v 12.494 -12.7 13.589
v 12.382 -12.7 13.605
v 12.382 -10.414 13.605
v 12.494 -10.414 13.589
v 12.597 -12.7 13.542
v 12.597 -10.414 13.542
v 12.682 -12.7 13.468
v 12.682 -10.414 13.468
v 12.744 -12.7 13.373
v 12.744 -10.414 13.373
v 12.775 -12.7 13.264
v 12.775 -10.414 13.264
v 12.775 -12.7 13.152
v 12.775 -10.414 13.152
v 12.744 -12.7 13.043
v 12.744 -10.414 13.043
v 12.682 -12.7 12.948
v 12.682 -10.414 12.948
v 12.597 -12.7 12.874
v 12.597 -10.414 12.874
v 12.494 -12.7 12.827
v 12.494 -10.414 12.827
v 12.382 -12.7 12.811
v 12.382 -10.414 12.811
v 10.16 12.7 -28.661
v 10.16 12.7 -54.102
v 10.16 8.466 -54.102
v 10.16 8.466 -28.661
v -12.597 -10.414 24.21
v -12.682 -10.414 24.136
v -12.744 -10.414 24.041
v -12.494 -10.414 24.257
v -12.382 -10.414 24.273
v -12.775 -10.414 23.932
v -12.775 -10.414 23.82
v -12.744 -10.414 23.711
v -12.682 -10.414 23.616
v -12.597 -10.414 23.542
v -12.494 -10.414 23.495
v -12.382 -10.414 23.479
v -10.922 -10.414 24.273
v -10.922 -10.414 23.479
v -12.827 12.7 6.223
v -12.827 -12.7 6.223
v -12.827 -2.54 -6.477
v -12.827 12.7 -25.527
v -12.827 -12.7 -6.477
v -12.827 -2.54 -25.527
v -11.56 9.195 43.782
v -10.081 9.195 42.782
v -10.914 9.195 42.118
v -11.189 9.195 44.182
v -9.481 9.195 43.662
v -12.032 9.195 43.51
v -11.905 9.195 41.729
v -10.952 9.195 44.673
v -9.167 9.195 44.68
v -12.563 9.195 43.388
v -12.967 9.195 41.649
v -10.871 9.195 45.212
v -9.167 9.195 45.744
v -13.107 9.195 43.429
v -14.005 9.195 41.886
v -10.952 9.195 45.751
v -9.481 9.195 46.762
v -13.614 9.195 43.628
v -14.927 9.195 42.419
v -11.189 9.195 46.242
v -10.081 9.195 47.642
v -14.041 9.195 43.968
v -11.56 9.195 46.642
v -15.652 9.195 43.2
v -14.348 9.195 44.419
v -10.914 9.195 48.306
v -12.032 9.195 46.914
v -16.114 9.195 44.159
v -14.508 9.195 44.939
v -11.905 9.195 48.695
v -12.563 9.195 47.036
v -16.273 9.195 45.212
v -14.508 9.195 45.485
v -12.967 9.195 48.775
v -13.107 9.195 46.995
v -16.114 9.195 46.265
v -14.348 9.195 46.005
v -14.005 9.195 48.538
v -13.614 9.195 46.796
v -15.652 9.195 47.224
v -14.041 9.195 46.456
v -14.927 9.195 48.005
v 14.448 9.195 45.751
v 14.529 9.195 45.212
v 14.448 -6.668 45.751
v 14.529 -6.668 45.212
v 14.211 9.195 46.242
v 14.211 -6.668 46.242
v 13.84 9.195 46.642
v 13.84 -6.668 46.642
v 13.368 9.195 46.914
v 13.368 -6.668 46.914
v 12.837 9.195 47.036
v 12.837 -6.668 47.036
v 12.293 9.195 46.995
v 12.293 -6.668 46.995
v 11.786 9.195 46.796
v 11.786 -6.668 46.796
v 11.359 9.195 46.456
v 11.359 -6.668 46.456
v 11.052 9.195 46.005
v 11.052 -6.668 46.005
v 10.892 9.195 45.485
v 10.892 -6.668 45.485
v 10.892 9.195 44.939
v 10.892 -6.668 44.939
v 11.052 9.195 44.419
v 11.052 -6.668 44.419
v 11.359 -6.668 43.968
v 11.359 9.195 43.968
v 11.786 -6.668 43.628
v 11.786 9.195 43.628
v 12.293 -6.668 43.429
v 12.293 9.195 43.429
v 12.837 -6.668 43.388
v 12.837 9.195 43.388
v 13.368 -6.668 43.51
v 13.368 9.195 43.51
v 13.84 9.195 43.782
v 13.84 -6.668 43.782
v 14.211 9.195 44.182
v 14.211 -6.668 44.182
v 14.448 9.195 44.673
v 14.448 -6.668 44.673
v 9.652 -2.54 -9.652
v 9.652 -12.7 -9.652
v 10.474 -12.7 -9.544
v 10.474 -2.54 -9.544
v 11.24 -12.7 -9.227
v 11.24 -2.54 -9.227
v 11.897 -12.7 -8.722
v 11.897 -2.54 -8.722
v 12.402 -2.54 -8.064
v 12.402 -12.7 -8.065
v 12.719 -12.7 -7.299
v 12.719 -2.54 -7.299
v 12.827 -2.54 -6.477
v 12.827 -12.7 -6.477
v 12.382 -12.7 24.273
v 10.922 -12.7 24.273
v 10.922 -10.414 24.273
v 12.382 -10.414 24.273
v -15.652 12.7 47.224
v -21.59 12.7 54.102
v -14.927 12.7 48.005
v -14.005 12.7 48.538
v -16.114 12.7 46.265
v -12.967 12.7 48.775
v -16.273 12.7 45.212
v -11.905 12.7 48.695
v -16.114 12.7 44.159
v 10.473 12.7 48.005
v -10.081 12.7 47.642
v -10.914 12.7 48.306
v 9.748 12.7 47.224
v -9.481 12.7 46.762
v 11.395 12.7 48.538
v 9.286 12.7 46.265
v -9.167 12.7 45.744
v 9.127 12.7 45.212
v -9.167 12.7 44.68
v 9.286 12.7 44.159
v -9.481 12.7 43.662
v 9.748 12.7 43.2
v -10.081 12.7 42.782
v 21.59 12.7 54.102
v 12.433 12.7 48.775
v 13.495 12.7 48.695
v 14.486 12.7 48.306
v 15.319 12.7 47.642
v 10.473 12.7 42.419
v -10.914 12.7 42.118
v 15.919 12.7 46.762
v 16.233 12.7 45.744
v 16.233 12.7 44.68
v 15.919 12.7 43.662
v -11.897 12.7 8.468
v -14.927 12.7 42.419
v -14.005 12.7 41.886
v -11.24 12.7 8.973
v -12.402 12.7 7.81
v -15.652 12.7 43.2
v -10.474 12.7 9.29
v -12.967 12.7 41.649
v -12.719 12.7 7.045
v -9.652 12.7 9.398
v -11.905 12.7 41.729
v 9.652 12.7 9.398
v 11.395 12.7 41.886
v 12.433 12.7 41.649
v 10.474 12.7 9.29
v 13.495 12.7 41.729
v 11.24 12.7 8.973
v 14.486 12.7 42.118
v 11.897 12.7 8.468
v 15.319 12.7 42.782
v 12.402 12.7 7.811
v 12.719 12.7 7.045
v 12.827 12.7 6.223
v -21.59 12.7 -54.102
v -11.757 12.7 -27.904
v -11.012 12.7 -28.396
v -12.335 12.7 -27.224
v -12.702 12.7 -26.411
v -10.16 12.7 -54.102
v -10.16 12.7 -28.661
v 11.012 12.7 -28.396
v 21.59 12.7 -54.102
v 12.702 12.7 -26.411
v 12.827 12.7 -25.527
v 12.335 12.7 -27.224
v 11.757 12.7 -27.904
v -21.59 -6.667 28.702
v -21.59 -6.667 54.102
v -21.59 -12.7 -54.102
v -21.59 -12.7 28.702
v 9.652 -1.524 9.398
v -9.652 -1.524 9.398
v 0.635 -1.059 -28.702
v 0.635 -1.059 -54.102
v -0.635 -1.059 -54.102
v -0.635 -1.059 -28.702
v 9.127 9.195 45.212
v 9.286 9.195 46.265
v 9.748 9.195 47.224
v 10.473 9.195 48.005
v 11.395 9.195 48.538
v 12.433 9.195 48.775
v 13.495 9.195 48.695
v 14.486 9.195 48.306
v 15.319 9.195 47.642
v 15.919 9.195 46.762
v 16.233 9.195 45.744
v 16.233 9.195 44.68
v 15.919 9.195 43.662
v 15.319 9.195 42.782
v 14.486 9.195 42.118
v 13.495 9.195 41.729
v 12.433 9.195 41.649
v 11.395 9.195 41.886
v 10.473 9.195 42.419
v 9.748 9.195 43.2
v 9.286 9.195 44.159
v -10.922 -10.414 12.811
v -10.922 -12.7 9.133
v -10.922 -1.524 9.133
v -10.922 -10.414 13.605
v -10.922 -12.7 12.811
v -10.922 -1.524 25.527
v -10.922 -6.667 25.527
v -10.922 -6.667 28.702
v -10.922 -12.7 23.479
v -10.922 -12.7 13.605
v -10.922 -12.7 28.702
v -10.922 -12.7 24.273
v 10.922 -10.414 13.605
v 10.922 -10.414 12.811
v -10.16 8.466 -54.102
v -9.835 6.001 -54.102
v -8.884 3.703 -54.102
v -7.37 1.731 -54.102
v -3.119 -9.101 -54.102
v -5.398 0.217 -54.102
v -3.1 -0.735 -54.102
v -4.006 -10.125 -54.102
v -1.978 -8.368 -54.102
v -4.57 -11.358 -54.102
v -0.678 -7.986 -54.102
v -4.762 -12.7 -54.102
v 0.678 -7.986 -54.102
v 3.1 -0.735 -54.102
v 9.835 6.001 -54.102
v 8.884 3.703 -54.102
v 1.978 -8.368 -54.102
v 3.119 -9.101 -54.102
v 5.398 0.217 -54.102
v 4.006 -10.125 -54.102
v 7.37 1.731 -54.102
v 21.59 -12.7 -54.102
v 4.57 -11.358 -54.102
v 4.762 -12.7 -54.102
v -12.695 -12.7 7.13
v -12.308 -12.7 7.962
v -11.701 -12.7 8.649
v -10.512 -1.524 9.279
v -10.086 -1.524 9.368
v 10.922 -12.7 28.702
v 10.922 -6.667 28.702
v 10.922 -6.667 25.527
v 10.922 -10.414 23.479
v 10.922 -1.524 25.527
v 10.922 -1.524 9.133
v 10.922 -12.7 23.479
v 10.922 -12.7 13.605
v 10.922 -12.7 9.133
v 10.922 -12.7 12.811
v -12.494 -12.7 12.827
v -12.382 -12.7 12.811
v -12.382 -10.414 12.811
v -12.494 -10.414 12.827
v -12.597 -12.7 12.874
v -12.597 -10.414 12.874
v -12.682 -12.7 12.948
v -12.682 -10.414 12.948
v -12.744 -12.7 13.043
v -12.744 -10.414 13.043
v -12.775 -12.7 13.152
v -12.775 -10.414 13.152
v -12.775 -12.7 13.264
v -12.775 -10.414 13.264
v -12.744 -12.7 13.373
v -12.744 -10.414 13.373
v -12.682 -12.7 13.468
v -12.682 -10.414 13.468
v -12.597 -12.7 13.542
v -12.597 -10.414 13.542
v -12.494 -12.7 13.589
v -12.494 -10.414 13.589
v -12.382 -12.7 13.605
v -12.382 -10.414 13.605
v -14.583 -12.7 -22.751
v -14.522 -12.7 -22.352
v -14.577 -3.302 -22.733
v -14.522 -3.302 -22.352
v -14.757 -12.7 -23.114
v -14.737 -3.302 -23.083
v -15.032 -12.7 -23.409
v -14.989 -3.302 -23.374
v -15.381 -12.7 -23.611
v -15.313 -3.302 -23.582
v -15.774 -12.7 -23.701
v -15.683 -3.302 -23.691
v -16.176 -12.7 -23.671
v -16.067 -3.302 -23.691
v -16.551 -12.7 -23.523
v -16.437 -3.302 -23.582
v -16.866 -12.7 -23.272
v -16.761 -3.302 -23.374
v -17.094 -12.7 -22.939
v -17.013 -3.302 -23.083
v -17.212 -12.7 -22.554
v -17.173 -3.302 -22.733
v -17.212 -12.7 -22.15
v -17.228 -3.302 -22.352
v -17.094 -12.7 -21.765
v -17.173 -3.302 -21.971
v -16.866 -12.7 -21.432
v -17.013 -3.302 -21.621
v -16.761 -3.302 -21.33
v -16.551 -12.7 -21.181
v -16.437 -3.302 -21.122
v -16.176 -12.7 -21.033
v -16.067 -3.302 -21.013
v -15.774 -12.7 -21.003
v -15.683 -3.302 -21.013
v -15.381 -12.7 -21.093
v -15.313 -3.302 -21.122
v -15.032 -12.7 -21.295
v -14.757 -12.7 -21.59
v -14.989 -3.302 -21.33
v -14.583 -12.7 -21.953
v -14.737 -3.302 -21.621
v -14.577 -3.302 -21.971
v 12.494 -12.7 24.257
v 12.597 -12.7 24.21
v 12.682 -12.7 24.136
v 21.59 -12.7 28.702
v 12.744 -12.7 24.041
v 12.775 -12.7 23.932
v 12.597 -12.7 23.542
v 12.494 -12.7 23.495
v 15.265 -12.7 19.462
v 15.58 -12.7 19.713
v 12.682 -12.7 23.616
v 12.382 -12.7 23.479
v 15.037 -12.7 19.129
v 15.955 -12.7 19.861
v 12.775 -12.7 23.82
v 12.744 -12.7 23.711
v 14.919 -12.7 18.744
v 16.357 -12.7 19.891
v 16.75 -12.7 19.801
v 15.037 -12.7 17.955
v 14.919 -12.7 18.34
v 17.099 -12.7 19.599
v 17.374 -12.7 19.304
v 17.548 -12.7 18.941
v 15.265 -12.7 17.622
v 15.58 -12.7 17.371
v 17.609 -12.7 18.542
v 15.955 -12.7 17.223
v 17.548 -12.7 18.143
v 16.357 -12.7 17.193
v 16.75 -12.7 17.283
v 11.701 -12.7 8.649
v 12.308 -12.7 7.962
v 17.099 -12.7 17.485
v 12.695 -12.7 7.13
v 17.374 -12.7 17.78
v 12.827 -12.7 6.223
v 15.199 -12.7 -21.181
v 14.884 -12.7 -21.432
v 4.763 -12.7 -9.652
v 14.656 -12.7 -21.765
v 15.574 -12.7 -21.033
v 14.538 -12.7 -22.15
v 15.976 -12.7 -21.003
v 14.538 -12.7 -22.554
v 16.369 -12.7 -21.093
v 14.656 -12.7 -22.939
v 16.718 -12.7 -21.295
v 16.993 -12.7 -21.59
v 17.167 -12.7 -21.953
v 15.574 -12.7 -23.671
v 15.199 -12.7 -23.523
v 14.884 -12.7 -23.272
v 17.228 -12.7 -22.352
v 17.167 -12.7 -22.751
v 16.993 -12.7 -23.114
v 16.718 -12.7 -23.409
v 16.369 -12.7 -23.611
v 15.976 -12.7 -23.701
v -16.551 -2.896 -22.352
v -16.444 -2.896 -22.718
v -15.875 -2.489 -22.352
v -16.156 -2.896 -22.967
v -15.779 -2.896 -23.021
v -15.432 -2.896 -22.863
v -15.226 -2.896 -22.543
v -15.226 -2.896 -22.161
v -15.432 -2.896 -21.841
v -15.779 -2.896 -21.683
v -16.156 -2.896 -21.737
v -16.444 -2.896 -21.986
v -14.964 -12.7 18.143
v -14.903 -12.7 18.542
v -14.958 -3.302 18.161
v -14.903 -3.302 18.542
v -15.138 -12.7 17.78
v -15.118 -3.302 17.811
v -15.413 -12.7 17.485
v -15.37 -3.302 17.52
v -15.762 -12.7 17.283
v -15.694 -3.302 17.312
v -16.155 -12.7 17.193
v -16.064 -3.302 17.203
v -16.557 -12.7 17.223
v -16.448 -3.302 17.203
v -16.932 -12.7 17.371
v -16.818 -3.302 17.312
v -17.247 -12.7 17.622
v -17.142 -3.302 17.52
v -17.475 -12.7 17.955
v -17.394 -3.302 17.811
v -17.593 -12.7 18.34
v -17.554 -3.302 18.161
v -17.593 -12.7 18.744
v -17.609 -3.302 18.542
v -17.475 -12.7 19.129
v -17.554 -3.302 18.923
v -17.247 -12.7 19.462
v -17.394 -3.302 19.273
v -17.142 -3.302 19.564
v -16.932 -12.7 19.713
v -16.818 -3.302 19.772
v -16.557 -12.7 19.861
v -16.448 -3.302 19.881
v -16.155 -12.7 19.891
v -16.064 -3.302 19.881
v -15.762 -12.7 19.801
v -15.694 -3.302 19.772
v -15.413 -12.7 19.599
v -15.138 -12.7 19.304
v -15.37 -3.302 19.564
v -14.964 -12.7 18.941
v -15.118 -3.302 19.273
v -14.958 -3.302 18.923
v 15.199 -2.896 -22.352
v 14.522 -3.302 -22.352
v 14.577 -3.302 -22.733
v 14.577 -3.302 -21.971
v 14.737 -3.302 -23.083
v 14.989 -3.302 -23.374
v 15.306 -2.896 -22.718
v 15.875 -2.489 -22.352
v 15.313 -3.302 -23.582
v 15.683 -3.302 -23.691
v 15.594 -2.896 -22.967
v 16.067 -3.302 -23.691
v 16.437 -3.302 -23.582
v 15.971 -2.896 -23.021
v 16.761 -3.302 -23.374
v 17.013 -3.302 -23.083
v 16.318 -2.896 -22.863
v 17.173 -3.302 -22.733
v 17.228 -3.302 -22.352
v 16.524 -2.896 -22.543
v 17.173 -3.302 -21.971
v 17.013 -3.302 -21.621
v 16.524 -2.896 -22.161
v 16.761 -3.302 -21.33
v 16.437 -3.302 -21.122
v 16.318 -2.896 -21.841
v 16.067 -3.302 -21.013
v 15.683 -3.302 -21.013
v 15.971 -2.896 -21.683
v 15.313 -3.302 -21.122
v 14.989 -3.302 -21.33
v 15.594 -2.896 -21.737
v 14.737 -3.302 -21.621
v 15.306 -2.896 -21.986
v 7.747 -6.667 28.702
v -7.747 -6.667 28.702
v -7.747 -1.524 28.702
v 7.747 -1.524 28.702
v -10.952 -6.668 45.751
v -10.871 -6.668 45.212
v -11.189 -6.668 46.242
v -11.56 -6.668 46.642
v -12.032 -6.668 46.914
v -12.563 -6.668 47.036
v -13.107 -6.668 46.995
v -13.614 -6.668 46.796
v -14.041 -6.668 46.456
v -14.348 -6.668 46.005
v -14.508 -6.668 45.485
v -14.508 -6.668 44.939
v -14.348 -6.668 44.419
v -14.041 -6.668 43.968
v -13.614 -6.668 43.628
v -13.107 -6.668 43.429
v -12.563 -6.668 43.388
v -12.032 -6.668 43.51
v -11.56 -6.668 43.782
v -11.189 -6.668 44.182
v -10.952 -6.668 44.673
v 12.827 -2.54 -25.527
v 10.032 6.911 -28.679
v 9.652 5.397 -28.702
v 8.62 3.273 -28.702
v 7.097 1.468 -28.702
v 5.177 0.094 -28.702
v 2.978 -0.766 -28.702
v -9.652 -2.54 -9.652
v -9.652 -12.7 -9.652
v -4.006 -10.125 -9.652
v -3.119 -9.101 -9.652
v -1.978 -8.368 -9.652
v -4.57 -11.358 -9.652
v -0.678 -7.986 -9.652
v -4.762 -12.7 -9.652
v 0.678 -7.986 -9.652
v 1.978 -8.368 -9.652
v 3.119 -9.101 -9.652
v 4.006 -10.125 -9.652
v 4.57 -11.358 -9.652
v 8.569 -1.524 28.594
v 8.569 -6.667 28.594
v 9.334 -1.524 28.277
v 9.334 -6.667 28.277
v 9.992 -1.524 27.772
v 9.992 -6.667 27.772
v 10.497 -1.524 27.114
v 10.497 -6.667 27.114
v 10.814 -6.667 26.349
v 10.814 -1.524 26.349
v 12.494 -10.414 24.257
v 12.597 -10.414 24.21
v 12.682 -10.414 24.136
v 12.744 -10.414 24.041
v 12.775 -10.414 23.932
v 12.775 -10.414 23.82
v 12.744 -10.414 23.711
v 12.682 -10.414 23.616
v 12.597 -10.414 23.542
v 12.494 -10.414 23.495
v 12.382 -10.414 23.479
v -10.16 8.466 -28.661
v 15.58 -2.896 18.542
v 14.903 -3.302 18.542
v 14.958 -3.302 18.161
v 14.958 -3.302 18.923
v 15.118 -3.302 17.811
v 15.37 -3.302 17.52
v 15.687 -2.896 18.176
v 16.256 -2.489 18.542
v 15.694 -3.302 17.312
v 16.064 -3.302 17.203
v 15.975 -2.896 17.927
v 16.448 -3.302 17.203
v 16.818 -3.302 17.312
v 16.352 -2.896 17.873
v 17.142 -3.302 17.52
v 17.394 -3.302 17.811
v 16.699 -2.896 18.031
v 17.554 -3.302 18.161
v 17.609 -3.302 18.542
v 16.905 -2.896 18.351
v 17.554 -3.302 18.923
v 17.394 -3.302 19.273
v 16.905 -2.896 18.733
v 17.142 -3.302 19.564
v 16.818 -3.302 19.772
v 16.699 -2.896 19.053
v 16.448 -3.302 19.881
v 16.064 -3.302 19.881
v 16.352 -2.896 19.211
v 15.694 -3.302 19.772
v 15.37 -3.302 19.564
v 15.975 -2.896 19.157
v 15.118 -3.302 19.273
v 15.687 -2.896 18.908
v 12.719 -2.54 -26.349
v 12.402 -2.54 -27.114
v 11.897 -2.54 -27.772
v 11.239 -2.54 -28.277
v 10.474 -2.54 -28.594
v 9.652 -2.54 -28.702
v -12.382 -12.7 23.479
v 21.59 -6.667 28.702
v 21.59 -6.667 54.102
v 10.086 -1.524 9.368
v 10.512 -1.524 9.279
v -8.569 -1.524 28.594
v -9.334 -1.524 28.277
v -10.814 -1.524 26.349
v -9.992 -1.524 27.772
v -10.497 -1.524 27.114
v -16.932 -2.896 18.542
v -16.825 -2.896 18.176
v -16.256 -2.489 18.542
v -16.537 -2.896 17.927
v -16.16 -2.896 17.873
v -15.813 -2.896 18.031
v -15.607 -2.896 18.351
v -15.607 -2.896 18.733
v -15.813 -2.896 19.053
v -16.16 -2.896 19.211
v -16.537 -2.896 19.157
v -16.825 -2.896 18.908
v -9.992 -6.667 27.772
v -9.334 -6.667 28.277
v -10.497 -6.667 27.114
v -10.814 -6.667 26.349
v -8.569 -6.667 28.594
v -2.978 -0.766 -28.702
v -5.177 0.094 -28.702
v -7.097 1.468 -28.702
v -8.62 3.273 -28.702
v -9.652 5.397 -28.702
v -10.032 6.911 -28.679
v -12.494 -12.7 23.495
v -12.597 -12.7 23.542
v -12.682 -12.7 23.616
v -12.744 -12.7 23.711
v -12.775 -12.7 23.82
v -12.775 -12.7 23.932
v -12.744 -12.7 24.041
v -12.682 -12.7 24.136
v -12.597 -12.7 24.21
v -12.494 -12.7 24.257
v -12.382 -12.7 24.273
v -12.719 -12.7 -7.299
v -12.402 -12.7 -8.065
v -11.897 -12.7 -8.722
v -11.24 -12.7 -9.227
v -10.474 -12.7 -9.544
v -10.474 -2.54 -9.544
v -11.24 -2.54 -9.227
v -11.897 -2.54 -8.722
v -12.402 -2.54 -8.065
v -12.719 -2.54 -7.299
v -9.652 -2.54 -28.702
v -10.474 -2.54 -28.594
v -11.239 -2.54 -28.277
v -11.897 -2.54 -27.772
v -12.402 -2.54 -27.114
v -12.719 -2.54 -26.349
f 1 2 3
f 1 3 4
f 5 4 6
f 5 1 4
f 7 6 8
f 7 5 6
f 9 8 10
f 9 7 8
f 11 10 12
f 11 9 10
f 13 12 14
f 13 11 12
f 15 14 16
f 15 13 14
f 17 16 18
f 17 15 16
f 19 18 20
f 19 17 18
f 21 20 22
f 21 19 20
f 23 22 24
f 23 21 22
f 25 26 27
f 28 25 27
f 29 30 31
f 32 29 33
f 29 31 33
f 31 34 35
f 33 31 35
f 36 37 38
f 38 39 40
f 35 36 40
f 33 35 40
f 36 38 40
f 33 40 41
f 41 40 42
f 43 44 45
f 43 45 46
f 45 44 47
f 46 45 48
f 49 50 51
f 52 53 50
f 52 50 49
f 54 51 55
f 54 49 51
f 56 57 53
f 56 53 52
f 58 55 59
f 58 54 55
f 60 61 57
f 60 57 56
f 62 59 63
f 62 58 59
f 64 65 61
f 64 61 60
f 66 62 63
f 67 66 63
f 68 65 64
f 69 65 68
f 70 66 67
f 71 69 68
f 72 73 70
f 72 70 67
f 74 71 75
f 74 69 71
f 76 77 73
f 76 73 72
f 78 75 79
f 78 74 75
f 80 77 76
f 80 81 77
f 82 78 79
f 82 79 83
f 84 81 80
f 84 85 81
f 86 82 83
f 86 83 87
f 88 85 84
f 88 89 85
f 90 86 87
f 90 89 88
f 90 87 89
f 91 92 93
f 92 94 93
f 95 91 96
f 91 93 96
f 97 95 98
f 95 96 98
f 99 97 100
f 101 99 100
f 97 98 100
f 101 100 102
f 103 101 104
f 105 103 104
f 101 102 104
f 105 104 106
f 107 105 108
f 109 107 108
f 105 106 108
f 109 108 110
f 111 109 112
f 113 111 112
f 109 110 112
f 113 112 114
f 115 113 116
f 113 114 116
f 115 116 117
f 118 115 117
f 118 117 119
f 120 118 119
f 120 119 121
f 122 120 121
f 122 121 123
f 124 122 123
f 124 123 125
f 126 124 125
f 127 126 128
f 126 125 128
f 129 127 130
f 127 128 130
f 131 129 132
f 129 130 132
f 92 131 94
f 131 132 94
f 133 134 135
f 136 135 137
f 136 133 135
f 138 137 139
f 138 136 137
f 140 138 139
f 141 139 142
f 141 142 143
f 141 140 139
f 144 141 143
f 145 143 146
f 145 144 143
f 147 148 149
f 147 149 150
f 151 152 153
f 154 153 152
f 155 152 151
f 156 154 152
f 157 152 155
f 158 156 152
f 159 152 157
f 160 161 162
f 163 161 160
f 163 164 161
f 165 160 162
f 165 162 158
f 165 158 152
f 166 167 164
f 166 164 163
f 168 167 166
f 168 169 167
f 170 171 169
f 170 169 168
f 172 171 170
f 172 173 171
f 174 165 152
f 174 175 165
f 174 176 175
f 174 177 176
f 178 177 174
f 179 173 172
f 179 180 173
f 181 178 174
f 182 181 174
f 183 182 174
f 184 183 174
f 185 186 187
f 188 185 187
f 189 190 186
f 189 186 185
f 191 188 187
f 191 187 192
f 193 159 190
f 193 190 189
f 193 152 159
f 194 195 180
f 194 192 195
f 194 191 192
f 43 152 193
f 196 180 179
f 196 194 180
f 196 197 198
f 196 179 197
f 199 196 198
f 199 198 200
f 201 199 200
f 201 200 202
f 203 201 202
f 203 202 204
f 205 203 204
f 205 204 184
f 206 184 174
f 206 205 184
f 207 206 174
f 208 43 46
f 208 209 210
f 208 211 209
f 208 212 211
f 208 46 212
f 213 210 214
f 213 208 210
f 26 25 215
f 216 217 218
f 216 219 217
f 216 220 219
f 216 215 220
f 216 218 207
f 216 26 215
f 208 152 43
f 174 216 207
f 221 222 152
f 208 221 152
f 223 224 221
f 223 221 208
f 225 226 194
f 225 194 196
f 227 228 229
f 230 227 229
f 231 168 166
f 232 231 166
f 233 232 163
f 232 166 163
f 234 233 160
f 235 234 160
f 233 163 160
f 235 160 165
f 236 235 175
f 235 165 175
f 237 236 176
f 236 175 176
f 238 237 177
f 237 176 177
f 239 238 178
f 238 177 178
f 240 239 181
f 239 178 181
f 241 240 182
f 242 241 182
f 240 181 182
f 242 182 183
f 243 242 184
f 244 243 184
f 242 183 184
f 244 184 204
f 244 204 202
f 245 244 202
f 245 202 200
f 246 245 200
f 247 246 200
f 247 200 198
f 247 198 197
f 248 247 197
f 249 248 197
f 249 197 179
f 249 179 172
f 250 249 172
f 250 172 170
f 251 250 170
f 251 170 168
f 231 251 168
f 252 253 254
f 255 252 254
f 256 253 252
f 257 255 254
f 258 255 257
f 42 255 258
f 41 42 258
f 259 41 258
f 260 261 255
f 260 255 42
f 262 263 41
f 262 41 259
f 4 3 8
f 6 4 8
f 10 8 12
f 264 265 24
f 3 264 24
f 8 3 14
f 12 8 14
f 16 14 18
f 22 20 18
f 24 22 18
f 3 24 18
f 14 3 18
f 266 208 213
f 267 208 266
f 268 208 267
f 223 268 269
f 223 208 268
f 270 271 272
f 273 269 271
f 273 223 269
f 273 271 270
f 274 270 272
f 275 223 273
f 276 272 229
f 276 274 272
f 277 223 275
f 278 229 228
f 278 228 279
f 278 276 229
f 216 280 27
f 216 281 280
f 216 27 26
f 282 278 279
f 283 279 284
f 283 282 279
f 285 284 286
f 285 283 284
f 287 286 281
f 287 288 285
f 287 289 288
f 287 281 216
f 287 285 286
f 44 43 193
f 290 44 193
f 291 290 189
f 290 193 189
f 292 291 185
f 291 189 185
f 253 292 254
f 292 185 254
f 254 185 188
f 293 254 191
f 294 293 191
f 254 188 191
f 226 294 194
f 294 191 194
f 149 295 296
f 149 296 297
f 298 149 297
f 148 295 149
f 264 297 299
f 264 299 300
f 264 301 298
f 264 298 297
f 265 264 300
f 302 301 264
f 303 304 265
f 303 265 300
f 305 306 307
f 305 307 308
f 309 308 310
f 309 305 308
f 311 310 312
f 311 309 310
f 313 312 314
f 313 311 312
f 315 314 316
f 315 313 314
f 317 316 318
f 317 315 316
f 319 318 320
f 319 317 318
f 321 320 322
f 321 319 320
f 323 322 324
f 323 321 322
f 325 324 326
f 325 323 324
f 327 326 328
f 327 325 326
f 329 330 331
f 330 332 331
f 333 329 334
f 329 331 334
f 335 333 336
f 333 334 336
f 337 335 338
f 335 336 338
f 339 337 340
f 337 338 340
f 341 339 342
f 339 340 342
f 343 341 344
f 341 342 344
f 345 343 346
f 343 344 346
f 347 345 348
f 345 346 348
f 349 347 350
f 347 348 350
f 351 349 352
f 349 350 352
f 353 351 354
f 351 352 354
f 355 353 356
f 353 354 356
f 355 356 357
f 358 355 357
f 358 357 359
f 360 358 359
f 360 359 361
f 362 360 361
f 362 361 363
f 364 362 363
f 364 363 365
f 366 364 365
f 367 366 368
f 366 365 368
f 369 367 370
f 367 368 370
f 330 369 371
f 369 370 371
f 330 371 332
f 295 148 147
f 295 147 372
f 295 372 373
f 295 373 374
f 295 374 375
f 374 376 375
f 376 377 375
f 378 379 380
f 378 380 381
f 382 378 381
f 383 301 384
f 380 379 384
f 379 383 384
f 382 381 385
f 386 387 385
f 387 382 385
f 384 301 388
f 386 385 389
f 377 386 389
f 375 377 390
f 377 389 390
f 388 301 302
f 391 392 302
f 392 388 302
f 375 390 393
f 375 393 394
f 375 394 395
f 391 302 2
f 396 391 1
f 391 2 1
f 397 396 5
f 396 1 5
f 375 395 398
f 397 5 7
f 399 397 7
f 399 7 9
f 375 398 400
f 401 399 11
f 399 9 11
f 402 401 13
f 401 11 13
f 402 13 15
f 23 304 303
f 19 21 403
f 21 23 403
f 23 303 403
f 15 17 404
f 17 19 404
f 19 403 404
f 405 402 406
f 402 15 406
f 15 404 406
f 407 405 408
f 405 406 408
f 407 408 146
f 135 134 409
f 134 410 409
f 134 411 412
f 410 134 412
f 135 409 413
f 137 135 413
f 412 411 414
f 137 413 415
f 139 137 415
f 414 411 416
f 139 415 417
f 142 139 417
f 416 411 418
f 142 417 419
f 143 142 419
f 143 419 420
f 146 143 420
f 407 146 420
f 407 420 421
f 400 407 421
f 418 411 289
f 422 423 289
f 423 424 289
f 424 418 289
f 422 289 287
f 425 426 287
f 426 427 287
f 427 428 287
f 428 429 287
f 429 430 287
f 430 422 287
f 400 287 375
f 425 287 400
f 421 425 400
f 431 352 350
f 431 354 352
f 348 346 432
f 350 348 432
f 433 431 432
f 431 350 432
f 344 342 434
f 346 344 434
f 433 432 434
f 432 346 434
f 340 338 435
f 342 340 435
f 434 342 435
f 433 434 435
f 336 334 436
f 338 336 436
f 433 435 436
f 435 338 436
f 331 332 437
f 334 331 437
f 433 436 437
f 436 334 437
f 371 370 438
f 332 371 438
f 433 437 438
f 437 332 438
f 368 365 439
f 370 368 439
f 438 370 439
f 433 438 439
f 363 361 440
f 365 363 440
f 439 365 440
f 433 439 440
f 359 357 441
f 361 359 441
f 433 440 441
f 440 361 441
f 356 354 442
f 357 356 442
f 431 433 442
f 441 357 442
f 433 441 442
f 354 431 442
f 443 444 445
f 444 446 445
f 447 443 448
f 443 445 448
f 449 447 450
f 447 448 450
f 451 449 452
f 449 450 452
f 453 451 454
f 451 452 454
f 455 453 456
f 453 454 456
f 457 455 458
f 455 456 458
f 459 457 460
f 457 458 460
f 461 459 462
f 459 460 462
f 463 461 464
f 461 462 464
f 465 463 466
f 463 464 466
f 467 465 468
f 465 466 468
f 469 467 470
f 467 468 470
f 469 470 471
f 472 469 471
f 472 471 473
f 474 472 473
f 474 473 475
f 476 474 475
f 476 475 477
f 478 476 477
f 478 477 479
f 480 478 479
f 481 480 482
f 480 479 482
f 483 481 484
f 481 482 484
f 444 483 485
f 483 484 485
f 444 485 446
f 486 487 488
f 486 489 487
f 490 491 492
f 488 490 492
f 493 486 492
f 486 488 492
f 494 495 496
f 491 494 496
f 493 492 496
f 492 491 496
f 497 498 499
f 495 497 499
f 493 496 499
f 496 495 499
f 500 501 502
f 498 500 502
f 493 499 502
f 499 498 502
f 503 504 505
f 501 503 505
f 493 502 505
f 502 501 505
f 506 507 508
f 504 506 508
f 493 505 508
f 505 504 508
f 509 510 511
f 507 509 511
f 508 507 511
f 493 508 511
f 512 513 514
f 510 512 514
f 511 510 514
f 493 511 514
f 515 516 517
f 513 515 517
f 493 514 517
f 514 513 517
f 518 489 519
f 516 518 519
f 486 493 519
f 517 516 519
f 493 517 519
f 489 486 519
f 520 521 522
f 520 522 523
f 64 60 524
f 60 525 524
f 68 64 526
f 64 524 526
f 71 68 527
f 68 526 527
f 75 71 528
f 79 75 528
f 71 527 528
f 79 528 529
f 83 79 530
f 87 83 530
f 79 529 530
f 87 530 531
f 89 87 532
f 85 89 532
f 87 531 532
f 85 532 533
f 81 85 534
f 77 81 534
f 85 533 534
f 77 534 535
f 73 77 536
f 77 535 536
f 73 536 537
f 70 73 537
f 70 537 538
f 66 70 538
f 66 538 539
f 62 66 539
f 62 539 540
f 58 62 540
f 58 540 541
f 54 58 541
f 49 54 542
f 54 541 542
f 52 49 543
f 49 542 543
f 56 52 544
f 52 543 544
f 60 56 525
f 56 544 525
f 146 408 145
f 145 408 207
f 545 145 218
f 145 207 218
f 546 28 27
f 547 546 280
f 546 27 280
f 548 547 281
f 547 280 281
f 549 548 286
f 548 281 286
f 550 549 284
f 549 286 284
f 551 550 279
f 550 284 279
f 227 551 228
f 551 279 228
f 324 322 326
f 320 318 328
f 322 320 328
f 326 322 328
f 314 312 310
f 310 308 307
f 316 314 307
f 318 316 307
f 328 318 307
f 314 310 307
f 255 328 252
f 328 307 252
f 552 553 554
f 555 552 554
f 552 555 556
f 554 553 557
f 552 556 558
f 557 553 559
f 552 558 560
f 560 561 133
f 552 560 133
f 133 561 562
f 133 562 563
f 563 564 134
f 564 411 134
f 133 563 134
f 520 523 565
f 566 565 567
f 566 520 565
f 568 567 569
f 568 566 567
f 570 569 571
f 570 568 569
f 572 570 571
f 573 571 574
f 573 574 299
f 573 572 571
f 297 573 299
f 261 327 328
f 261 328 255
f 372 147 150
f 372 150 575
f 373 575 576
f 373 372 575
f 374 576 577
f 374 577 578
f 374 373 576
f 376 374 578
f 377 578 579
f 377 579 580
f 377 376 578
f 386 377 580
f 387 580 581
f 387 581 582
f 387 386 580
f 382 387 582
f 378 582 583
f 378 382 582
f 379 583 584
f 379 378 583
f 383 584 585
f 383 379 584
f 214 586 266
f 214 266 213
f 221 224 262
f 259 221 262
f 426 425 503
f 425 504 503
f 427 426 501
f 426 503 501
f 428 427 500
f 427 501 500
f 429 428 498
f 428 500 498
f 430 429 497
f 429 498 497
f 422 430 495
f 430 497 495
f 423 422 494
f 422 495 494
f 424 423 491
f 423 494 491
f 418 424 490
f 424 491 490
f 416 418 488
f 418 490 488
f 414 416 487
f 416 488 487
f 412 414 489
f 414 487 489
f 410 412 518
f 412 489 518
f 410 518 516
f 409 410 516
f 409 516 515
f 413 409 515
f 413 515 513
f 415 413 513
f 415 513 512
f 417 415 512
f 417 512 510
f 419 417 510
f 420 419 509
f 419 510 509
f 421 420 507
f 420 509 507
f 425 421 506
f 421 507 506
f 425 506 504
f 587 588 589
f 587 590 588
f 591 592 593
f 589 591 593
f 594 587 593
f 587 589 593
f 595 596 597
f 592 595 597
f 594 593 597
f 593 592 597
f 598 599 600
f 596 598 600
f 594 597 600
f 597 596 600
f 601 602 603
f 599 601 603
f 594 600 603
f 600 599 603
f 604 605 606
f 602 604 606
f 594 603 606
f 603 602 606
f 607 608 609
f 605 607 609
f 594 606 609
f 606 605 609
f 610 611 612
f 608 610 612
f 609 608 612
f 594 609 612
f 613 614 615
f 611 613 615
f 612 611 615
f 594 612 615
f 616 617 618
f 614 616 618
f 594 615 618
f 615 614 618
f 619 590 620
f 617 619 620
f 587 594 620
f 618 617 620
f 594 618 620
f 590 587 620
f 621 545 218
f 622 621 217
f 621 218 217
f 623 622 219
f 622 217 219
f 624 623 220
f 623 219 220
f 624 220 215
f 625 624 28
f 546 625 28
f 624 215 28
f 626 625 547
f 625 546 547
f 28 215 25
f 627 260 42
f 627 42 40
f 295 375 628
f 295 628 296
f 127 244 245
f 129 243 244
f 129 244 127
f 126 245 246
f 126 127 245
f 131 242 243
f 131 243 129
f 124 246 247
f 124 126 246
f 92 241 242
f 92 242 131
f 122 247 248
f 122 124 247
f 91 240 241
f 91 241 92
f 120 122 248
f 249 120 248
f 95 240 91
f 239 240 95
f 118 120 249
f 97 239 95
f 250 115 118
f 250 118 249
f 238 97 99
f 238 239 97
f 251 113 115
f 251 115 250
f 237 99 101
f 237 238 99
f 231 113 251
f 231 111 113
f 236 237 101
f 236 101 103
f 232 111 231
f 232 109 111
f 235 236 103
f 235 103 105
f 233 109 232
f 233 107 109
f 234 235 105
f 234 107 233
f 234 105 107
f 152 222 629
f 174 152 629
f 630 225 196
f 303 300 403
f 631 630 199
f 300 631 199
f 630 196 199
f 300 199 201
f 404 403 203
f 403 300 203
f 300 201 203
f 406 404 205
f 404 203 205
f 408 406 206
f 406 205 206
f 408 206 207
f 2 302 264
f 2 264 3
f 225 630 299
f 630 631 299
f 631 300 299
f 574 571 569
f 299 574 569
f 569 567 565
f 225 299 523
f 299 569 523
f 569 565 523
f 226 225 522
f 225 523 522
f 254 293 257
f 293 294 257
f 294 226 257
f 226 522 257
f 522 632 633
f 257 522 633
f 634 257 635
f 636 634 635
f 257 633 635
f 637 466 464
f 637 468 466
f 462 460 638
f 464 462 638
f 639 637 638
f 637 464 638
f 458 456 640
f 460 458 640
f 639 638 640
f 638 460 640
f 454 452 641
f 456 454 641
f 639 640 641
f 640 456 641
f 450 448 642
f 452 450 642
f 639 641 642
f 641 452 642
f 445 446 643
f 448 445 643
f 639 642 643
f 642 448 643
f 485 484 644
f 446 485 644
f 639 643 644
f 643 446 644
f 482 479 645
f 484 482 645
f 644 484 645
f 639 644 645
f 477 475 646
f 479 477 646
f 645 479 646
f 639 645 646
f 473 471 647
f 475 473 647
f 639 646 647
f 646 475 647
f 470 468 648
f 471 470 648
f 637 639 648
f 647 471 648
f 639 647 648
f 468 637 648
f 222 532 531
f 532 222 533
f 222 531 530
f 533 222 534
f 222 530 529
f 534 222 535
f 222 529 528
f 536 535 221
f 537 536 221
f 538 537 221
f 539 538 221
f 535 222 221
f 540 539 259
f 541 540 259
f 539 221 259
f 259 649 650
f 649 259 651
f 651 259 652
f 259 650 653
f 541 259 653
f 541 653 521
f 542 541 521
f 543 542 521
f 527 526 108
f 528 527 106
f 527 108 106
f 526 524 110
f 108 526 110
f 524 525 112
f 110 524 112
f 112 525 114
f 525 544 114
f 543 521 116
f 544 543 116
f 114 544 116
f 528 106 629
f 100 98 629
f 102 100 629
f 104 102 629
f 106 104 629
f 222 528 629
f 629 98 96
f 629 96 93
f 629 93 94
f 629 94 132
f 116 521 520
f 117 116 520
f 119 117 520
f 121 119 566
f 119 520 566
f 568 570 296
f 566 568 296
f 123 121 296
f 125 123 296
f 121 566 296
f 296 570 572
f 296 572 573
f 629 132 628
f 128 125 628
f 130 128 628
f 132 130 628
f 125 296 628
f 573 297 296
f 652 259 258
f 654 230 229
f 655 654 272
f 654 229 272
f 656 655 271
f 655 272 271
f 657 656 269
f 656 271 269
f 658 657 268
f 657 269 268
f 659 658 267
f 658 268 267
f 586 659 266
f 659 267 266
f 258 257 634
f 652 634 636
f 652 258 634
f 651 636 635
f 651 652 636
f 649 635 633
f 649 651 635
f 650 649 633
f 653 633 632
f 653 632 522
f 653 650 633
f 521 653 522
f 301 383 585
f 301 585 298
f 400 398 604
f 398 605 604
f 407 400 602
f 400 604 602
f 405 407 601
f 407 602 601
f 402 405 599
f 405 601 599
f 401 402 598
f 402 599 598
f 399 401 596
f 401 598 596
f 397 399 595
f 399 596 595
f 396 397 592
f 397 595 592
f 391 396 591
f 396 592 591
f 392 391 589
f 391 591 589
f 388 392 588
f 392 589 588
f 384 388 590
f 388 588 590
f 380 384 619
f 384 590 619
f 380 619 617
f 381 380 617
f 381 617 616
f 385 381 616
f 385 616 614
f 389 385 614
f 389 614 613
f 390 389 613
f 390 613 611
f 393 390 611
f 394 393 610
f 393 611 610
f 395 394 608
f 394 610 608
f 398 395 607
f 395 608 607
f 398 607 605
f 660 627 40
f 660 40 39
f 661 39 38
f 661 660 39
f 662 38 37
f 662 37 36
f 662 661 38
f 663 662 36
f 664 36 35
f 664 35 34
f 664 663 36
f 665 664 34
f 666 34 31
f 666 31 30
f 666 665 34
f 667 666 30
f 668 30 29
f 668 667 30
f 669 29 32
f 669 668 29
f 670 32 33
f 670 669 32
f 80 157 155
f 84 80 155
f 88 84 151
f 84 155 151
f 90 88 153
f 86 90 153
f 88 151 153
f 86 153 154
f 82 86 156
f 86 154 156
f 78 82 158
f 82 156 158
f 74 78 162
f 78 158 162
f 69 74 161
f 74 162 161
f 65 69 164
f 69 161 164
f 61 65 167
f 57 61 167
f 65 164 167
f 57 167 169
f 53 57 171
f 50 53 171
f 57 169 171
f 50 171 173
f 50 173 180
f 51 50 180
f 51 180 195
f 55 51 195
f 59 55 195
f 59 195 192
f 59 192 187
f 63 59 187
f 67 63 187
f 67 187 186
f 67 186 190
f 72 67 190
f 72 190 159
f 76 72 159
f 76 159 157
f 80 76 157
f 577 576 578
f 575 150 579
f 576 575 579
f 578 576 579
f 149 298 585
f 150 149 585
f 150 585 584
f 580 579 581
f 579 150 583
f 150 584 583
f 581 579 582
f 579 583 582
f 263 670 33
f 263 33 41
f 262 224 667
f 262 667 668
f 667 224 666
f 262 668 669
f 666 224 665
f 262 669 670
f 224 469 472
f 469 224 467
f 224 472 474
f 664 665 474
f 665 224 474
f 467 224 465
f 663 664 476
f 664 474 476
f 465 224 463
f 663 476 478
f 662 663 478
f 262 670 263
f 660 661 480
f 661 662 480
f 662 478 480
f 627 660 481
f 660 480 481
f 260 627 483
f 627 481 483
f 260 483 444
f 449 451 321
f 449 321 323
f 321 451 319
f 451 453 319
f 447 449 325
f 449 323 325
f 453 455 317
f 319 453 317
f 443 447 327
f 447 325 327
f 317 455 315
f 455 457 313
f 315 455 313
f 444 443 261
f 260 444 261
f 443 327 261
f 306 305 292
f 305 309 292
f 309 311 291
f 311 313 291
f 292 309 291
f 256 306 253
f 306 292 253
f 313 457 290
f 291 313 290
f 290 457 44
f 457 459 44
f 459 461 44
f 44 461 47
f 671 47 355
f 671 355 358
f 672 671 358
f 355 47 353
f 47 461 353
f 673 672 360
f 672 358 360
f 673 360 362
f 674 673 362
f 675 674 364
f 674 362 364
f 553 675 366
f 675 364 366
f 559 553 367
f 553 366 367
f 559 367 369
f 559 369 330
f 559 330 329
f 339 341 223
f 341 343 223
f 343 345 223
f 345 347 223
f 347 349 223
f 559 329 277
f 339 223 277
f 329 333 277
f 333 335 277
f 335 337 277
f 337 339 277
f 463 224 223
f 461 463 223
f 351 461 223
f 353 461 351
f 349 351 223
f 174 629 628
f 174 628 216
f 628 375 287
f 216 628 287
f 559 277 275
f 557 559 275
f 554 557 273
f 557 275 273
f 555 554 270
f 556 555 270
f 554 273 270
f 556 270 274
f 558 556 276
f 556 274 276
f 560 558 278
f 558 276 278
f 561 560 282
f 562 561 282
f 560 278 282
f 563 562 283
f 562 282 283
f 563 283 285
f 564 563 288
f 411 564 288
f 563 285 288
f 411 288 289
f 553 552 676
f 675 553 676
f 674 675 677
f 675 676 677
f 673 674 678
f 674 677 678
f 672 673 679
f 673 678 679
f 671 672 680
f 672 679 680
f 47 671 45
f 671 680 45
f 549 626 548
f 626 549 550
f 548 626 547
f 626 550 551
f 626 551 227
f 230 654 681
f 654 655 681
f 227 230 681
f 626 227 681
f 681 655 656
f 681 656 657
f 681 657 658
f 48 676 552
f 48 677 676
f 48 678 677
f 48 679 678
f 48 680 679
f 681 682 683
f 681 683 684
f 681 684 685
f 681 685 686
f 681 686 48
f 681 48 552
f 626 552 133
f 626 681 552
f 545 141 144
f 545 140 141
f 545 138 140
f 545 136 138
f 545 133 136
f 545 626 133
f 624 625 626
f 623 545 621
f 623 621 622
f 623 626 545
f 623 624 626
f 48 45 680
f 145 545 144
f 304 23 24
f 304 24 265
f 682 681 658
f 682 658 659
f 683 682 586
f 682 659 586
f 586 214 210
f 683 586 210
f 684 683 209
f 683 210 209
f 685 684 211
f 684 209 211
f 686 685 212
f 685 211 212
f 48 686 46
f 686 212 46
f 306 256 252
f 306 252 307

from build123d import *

# Parameters (mm, degrees)
BASE_DEPTH                   = 12.7
BASE_DEPTH_BACK              = 12.7
SKETCH1_W                    = 43.18
SKETCH1_H                    = 108.204
ACTUATORPLANECUT_DEPTH       = 6.0325
CENTERSLOT_DEPTH             = 60.619162222
CENTERSLOT_DEPTH_BACK        = 60.619162222
SKETCH5_W                    = 25.654
SKETCH5_H                    = 19.05
SHAFTGUIDE_REACH             = 113.065
SKETCH2_R                    = 4.7625
CENTERSLOTFILLET_R           = 3.175
GEARBOXPIT_DEPTH             = 11.176
FRONTCUTAWAY_DEPTH           = 15.24
GEARBOXSLOTSH_DEPTH          = 2.286
TOGGLEASSEMHOLES_D           = 2.7051
TOGGLEASSEMHOLES_DEPTH       = 9.398
TOGGLEASSEMHOLES_TIP         = 0.81269403
GEARBOXMOUNTINGHOLES_D       = 2.7051
GEARBOXMOUNTINGHOLES_DEPTH   = 9.398
GEARBOXMOUNTINGHOLES_TIP     = 0.81269403
CAPMOUNTINGHOLES_D           = 3.6576
CAPMOUNTINGHOLES_CBORE_D     = 7.14502
CAPMOUNTINGHOLES_CBORE_DEPTH = 3.5052
ROLLMOTORSLOT_REACH          = 113.065


with BuildPart() as part:
    # Sketch1 → Base (new, two sides: drawn at the far end of the back side and taken through both)
    with BuildSketch(Plane(origin=(0, 0, 0), x_dir=(1, 0, 0), z_dir=(0, 1, 0)).offset(-BASE_DEPTH_BACK)):
        Rectangle(SKETCH1_W, SKETCH1_H)
    extrude(amount=BASE_DEPTH + BASE_DEPTH_BACK)

    # Sketch3 → ActuatorPlaneCut (cut)
    with BuildSketch(Plane(origin=(0, -12.7, 0), x_dir=(-1, 0, 0), z_dir=(0, -1, 0))):
        Polygon((10.922, -28.702), (16.256, -28.702), (21.59, -28.702), (21.59, -54.102), (-21.59, -54.102), (-21.59, -28.702), (-10.922, -28.702), (-10.922, -11.176), (10.922, -11.176), align=None)
    extrude(amount=-ACTUATORPLANECUT_DEPTH, mode=Mode.SUBTRACT)

    # Sketch5 → CenterSlot (cut, two sides: drawn at the far end of the back side and taken through both)
    with BuildSketch(Plane(origin=(0, 0, 0), x_dir=(1, 0, 0), z_dir=(0, 1, 0)).offset(-CENTERSLOT_DEPTH_BACK)):
        with Locations((0, 0.127)):
            Rectangle(SKETCH5_W, SKETCH5_H)
    extrude(amount=CENTERSLOT_DEPTH + CENTERSLOT_DEPTH_BACK, mode=Mode.SUBTRACT)

    # Sketch2 → ShaftGuide (cut, up to next)
    with BuildSketch(Plane(origin=(0, 0, -54.102), x_dir=(-1, 0, 0), z_dir=(0, 0, -1)), mode=Mode.PRIVATE) as shaftguide_sk1:
        with Locations((0, -12.7)):
            Circle(SKETCH2_R)
    shaftguide_tool1 = extrude(shaftguide_sk1.sketch, amount=-SHAFTGUIDE_REACH, mode=Mode.PRIVATE) & part.part
    add(shaftguide_tool1.solids().sort_by_distance((0, -12.7, -54.102))[0], mode=Mode.SUBTRACT)

    # CenterSlotFillet
    centerslotfillet_edges = [part.edges().sort_by_distance(p)[0] for p in [
        (-12.827, 0, -9.652),
        (-12.827, 0, 9.398),
        (12.827, 0, 9.398),
        (12.827, 0, -9.652),
    ]]
    fillet(centerslotfillet_edges, radius=CENTERSLOTFILLET_R)

    # Sketch40 → GearBoxPit (cut)
    with BuildSketch(Plane.XZ.offset(12.7)):
        with BuildLine():
            Line((10.922, 6.858), (-10.922, 6.858))
            Line((-10.922, 6.858), (-10.922, 25.527))
            ThreePointArc((-10.922, 25.527), (-9.99206403, 27.77206403), (-7.747, 28.702))
            Line((-7.747, 28.702), (7.747, 28.702))
            ThreePointArc((7.747, 28.702), (9.99206403, 27.77206403), (10.922, 25.527))
            Line((10.922, 25.527), (10.922, 6.858))
        make_face()
    extrude(amount=-GEARBOXPIT_DEPTH, mode=Mode.SUBTRACT)

    # Sketch60 → FrontCutaway (cut)
    with BuildSketch(Plane(origin=(0, 12.7, 0), x_dir=(1, 0, 0), z_dir=(0, 1, 0))):
        with BuildLine():
            Line((-12.827, 6.477), (12.827, 6.477))
            Line((12.827, 6.477), (12.827, 25.527))
            ThreePointArc((12.827, 25.527), (11.89706403, 27.77206403), (9.652, 28.702))
            Line((9.652, 28.702), (-9.652, 28.702))
            ThreePointArc((-9.652, 28.702), (-11.89706403, 27.77206403), (-12.827, 25.527))
            Line((-12.827, 25.527), (-12.827, 6.477))
        make_face()
    extrude(amount=-FRONTCUTAWAY_DEPTH, mode=Mode.SUBTRACT)

    # Sketch67 → GearBoxSlotsH (cut)
    with BuildSketch(Plane(origin=(0, -12.7, 0), x_dir=(-1, 0, 0), z_dir=(0, -1, 0))):
        with BuildLine():
            Line((-12.3825, -12.811125), (12.3825, -12.811125))
            ThreePointArc((12.3825, -12.811125), (12.779375, -13.208), (12.3825, -13.604875))
            Line((12.3825, -13.604875), (-12.3825, -13.604875))
            ThreePointArc((-12.3825, -13.604875), (-12.779375, -13.208), (-12.3825, -12.811125))
        make_face()
        with BuildLine():
            Line((-12.3825, -23.479125), (12.3825, -23.479125))
            ThreePointArc((12.3825, -23.479125), (12.779375, -23.876), (12.3825, -24.272875))
            Line((12.3825, -24.272875), (-12.3825, -24.272875))
            ThreePointArc((-12.3825, -24.272875), (-12.779375, -23.876), (-12.3825, -23.479125))
        make_face()
    extrude(amount=-GEARBOXSLOTSH_DEPTH, mode=Mode.SUBTRACT)

    # ToggleAssemHoles
    with Locations(Plane(origin=(0, -12.7, 0), x_dir=(-1, 0, 0), z_dir=(0, -1, 0))):
        with Locations((15.875, 22.352), (-15.875, 22.352)):
            Hole(TOGGLEASSEMHOLES_D / 2, depth=TOGGLEASSEMHOLES_DEPTH)
            with Locations((0, 0, -(TOGGLEASSEMHOLES_DEPTH + TOGGLEASSEMHOLES_TIP / 2))):  # 118° drill point
                Cone(0, TOGGLEASSEMHOLES_D / 2, TOGGLEASSEMHOLES_TIP, mode=Mode.SUBTRACT)

    # GearBoxMountingHoles
    with Locations(Plane(origin=(0, -12.7, 0), x_dir=(-1, 0, 0), z_dir=(0, -1, 0))):
        with Locations((-16.256, -18.542), (16.256, -18.542)):
            Hole(GEARBOXMOUNTINGHOLES_D / 2, depth=GEARBOXMOUNTINGHOLES_DEPTH)
            with Locations((0, 0, -(GEARBOXMOUNTINGHOLES_DEPTH + GEARBOXMOUNTINGHOLES_TIP / 2))):  # 118° drill point
                Cone(0, GEARBOXMOUNTINGHOLES_D / 2, GEARBOXMOUNTINGHOLES_TIP, mode=Mode.SUBTRACT)

    # CapMountingHoles (through all)
    with Locations(Plane(origin=(-0.837932951, 12.7, 8.633720573), x_dir=(-1, 0, 0), z_dir=(0, 1, 0))):
        with Locations((-13.537932951, 36.578279427), (11.862067049, 36.578279427)):
            CounterBoreHole(CAPMOUNTINGHOLES_D / 2, CAPMOUNTINGHOLES_CBORE_D / 2, CAPMOUNTINGHOLES_CBORE_DEPTH)

    # Sketch81 → RollMotorSlot (cut, up to next)
    with BuildSketch(Plane(origin=(0, 0, -54.102), x_dir=(-1, 0, 0), z_dir=(0, 0, -1)), mode=Mode.PRIVATE) as rollmotorslot_sk1:
        with BuildLine():
            Line((10.16, 12.7), (-10.16, 12.7))
            Line((-10.16, 12.7), (-10.16, 8.46582))
            ThreePointArc((-10.16, 8.46582), (-7.370192091, 1.730627909), (-0.635, -1.05918))
            Line((-0.635, -1.05918), (0.635, -1.05918))
            ThreePointArc((0.635, -1.05918), (7.370192091, 1.730627909), (10.16, 8.46582))
            Line((10.16, 8.46582), (10.16, 12.7))
        make_face()
    rollmotorslot_tool1 = extrude(rollmotorslot_sk1.sketch, amount=-ROLLMOTORSLOT_REACH, mode=Mode.PRIVATE) & part.part
    add(rollmotorslot_tool1.solids().sort_by_distance((0, 6.589347, -54.102))[0], mode=Mode.SUBTRACT)


solid = part.part
